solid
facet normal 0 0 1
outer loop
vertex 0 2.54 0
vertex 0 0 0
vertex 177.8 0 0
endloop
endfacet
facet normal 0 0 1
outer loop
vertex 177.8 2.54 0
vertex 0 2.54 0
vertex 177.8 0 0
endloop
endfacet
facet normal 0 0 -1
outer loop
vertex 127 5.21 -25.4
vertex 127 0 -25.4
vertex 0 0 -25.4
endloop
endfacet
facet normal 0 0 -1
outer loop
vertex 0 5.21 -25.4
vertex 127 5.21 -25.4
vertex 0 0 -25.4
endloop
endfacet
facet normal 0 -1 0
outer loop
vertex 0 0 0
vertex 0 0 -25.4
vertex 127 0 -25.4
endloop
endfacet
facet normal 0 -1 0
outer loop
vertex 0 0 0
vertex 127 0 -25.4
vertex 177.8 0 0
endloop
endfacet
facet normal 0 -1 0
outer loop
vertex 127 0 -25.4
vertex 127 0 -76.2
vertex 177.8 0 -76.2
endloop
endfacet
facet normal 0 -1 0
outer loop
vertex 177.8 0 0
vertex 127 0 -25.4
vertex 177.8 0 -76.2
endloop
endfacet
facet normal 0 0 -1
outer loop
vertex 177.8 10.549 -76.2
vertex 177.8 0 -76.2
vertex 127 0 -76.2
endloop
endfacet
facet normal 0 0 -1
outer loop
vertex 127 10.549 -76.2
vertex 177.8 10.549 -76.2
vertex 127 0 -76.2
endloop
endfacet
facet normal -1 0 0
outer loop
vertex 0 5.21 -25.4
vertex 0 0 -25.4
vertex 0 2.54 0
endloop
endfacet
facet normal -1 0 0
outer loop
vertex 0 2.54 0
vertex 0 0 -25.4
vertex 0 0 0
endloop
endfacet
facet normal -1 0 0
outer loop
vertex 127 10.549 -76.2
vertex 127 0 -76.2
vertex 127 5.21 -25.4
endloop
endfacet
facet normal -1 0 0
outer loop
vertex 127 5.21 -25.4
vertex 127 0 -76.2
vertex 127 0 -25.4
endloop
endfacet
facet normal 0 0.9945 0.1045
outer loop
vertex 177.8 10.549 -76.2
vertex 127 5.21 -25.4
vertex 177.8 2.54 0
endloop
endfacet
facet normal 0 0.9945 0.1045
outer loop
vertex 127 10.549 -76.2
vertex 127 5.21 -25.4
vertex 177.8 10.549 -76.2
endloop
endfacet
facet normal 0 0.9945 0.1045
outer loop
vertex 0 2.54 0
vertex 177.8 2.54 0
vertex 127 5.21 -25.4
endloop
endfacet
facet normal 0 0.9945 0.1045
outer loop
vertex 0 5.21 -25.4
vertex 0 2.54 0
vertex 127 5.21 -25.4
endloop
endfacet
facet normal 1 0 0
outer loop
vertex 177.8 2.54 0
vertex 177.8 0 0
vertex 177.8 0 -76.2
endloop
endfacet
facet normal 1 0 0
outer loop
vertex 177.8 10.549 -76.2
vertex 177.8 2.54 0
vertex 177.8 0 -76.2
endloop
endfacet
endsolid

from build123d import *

# Parameters (mm, degrees)
BOSS_EXTRUDE1_DEPTH = 15.24
CHAMFER1_SIZE       = 12.7
CHAMFER1_SIZE_2     = 120.832428569


with BuildPart() as part:
    # Sketch1 → Boss-Extrude1 (new body)
    with BuildSketch(Plane(origin=(0, 0, 0), x_dir=(1, 0, 0), z_dir=(0, 1, 0))):
        Polygon((0, 0), (177.8, 0), (177.8, 76.2), (127, 76.2), (127, 25.4), (0, 25.4), align=None)
    extrude(amount=BOSS_EXTRUDE1_DEPTH)

    # Chamfer1
    # the kernel refuses this chamfer: 120.832428569, 12.7 mm, written as the material it takes off along each edge
    with BuildSketch(Plane(origin=(-314.100660456, 15.24, 0), x_dir=(0, -0.9396808679591153, 0.34205243222582665), z_dir=(1, 0, 0))) as chamfer1_piece_1:
        Polygon((CHAMFER1_SIZE * 0.939680867959, CHAMFER1_SIZE * 0.342052432226), (-CHAMFER1_SIZE_2 * 0.342052432225, CHAMFER1_SIZE_2 * 0.939680867956), (0, 0), align=None)
    extrude(amount=806.001320912, mode=Mode.SUBTRACT)


solid = part.part
